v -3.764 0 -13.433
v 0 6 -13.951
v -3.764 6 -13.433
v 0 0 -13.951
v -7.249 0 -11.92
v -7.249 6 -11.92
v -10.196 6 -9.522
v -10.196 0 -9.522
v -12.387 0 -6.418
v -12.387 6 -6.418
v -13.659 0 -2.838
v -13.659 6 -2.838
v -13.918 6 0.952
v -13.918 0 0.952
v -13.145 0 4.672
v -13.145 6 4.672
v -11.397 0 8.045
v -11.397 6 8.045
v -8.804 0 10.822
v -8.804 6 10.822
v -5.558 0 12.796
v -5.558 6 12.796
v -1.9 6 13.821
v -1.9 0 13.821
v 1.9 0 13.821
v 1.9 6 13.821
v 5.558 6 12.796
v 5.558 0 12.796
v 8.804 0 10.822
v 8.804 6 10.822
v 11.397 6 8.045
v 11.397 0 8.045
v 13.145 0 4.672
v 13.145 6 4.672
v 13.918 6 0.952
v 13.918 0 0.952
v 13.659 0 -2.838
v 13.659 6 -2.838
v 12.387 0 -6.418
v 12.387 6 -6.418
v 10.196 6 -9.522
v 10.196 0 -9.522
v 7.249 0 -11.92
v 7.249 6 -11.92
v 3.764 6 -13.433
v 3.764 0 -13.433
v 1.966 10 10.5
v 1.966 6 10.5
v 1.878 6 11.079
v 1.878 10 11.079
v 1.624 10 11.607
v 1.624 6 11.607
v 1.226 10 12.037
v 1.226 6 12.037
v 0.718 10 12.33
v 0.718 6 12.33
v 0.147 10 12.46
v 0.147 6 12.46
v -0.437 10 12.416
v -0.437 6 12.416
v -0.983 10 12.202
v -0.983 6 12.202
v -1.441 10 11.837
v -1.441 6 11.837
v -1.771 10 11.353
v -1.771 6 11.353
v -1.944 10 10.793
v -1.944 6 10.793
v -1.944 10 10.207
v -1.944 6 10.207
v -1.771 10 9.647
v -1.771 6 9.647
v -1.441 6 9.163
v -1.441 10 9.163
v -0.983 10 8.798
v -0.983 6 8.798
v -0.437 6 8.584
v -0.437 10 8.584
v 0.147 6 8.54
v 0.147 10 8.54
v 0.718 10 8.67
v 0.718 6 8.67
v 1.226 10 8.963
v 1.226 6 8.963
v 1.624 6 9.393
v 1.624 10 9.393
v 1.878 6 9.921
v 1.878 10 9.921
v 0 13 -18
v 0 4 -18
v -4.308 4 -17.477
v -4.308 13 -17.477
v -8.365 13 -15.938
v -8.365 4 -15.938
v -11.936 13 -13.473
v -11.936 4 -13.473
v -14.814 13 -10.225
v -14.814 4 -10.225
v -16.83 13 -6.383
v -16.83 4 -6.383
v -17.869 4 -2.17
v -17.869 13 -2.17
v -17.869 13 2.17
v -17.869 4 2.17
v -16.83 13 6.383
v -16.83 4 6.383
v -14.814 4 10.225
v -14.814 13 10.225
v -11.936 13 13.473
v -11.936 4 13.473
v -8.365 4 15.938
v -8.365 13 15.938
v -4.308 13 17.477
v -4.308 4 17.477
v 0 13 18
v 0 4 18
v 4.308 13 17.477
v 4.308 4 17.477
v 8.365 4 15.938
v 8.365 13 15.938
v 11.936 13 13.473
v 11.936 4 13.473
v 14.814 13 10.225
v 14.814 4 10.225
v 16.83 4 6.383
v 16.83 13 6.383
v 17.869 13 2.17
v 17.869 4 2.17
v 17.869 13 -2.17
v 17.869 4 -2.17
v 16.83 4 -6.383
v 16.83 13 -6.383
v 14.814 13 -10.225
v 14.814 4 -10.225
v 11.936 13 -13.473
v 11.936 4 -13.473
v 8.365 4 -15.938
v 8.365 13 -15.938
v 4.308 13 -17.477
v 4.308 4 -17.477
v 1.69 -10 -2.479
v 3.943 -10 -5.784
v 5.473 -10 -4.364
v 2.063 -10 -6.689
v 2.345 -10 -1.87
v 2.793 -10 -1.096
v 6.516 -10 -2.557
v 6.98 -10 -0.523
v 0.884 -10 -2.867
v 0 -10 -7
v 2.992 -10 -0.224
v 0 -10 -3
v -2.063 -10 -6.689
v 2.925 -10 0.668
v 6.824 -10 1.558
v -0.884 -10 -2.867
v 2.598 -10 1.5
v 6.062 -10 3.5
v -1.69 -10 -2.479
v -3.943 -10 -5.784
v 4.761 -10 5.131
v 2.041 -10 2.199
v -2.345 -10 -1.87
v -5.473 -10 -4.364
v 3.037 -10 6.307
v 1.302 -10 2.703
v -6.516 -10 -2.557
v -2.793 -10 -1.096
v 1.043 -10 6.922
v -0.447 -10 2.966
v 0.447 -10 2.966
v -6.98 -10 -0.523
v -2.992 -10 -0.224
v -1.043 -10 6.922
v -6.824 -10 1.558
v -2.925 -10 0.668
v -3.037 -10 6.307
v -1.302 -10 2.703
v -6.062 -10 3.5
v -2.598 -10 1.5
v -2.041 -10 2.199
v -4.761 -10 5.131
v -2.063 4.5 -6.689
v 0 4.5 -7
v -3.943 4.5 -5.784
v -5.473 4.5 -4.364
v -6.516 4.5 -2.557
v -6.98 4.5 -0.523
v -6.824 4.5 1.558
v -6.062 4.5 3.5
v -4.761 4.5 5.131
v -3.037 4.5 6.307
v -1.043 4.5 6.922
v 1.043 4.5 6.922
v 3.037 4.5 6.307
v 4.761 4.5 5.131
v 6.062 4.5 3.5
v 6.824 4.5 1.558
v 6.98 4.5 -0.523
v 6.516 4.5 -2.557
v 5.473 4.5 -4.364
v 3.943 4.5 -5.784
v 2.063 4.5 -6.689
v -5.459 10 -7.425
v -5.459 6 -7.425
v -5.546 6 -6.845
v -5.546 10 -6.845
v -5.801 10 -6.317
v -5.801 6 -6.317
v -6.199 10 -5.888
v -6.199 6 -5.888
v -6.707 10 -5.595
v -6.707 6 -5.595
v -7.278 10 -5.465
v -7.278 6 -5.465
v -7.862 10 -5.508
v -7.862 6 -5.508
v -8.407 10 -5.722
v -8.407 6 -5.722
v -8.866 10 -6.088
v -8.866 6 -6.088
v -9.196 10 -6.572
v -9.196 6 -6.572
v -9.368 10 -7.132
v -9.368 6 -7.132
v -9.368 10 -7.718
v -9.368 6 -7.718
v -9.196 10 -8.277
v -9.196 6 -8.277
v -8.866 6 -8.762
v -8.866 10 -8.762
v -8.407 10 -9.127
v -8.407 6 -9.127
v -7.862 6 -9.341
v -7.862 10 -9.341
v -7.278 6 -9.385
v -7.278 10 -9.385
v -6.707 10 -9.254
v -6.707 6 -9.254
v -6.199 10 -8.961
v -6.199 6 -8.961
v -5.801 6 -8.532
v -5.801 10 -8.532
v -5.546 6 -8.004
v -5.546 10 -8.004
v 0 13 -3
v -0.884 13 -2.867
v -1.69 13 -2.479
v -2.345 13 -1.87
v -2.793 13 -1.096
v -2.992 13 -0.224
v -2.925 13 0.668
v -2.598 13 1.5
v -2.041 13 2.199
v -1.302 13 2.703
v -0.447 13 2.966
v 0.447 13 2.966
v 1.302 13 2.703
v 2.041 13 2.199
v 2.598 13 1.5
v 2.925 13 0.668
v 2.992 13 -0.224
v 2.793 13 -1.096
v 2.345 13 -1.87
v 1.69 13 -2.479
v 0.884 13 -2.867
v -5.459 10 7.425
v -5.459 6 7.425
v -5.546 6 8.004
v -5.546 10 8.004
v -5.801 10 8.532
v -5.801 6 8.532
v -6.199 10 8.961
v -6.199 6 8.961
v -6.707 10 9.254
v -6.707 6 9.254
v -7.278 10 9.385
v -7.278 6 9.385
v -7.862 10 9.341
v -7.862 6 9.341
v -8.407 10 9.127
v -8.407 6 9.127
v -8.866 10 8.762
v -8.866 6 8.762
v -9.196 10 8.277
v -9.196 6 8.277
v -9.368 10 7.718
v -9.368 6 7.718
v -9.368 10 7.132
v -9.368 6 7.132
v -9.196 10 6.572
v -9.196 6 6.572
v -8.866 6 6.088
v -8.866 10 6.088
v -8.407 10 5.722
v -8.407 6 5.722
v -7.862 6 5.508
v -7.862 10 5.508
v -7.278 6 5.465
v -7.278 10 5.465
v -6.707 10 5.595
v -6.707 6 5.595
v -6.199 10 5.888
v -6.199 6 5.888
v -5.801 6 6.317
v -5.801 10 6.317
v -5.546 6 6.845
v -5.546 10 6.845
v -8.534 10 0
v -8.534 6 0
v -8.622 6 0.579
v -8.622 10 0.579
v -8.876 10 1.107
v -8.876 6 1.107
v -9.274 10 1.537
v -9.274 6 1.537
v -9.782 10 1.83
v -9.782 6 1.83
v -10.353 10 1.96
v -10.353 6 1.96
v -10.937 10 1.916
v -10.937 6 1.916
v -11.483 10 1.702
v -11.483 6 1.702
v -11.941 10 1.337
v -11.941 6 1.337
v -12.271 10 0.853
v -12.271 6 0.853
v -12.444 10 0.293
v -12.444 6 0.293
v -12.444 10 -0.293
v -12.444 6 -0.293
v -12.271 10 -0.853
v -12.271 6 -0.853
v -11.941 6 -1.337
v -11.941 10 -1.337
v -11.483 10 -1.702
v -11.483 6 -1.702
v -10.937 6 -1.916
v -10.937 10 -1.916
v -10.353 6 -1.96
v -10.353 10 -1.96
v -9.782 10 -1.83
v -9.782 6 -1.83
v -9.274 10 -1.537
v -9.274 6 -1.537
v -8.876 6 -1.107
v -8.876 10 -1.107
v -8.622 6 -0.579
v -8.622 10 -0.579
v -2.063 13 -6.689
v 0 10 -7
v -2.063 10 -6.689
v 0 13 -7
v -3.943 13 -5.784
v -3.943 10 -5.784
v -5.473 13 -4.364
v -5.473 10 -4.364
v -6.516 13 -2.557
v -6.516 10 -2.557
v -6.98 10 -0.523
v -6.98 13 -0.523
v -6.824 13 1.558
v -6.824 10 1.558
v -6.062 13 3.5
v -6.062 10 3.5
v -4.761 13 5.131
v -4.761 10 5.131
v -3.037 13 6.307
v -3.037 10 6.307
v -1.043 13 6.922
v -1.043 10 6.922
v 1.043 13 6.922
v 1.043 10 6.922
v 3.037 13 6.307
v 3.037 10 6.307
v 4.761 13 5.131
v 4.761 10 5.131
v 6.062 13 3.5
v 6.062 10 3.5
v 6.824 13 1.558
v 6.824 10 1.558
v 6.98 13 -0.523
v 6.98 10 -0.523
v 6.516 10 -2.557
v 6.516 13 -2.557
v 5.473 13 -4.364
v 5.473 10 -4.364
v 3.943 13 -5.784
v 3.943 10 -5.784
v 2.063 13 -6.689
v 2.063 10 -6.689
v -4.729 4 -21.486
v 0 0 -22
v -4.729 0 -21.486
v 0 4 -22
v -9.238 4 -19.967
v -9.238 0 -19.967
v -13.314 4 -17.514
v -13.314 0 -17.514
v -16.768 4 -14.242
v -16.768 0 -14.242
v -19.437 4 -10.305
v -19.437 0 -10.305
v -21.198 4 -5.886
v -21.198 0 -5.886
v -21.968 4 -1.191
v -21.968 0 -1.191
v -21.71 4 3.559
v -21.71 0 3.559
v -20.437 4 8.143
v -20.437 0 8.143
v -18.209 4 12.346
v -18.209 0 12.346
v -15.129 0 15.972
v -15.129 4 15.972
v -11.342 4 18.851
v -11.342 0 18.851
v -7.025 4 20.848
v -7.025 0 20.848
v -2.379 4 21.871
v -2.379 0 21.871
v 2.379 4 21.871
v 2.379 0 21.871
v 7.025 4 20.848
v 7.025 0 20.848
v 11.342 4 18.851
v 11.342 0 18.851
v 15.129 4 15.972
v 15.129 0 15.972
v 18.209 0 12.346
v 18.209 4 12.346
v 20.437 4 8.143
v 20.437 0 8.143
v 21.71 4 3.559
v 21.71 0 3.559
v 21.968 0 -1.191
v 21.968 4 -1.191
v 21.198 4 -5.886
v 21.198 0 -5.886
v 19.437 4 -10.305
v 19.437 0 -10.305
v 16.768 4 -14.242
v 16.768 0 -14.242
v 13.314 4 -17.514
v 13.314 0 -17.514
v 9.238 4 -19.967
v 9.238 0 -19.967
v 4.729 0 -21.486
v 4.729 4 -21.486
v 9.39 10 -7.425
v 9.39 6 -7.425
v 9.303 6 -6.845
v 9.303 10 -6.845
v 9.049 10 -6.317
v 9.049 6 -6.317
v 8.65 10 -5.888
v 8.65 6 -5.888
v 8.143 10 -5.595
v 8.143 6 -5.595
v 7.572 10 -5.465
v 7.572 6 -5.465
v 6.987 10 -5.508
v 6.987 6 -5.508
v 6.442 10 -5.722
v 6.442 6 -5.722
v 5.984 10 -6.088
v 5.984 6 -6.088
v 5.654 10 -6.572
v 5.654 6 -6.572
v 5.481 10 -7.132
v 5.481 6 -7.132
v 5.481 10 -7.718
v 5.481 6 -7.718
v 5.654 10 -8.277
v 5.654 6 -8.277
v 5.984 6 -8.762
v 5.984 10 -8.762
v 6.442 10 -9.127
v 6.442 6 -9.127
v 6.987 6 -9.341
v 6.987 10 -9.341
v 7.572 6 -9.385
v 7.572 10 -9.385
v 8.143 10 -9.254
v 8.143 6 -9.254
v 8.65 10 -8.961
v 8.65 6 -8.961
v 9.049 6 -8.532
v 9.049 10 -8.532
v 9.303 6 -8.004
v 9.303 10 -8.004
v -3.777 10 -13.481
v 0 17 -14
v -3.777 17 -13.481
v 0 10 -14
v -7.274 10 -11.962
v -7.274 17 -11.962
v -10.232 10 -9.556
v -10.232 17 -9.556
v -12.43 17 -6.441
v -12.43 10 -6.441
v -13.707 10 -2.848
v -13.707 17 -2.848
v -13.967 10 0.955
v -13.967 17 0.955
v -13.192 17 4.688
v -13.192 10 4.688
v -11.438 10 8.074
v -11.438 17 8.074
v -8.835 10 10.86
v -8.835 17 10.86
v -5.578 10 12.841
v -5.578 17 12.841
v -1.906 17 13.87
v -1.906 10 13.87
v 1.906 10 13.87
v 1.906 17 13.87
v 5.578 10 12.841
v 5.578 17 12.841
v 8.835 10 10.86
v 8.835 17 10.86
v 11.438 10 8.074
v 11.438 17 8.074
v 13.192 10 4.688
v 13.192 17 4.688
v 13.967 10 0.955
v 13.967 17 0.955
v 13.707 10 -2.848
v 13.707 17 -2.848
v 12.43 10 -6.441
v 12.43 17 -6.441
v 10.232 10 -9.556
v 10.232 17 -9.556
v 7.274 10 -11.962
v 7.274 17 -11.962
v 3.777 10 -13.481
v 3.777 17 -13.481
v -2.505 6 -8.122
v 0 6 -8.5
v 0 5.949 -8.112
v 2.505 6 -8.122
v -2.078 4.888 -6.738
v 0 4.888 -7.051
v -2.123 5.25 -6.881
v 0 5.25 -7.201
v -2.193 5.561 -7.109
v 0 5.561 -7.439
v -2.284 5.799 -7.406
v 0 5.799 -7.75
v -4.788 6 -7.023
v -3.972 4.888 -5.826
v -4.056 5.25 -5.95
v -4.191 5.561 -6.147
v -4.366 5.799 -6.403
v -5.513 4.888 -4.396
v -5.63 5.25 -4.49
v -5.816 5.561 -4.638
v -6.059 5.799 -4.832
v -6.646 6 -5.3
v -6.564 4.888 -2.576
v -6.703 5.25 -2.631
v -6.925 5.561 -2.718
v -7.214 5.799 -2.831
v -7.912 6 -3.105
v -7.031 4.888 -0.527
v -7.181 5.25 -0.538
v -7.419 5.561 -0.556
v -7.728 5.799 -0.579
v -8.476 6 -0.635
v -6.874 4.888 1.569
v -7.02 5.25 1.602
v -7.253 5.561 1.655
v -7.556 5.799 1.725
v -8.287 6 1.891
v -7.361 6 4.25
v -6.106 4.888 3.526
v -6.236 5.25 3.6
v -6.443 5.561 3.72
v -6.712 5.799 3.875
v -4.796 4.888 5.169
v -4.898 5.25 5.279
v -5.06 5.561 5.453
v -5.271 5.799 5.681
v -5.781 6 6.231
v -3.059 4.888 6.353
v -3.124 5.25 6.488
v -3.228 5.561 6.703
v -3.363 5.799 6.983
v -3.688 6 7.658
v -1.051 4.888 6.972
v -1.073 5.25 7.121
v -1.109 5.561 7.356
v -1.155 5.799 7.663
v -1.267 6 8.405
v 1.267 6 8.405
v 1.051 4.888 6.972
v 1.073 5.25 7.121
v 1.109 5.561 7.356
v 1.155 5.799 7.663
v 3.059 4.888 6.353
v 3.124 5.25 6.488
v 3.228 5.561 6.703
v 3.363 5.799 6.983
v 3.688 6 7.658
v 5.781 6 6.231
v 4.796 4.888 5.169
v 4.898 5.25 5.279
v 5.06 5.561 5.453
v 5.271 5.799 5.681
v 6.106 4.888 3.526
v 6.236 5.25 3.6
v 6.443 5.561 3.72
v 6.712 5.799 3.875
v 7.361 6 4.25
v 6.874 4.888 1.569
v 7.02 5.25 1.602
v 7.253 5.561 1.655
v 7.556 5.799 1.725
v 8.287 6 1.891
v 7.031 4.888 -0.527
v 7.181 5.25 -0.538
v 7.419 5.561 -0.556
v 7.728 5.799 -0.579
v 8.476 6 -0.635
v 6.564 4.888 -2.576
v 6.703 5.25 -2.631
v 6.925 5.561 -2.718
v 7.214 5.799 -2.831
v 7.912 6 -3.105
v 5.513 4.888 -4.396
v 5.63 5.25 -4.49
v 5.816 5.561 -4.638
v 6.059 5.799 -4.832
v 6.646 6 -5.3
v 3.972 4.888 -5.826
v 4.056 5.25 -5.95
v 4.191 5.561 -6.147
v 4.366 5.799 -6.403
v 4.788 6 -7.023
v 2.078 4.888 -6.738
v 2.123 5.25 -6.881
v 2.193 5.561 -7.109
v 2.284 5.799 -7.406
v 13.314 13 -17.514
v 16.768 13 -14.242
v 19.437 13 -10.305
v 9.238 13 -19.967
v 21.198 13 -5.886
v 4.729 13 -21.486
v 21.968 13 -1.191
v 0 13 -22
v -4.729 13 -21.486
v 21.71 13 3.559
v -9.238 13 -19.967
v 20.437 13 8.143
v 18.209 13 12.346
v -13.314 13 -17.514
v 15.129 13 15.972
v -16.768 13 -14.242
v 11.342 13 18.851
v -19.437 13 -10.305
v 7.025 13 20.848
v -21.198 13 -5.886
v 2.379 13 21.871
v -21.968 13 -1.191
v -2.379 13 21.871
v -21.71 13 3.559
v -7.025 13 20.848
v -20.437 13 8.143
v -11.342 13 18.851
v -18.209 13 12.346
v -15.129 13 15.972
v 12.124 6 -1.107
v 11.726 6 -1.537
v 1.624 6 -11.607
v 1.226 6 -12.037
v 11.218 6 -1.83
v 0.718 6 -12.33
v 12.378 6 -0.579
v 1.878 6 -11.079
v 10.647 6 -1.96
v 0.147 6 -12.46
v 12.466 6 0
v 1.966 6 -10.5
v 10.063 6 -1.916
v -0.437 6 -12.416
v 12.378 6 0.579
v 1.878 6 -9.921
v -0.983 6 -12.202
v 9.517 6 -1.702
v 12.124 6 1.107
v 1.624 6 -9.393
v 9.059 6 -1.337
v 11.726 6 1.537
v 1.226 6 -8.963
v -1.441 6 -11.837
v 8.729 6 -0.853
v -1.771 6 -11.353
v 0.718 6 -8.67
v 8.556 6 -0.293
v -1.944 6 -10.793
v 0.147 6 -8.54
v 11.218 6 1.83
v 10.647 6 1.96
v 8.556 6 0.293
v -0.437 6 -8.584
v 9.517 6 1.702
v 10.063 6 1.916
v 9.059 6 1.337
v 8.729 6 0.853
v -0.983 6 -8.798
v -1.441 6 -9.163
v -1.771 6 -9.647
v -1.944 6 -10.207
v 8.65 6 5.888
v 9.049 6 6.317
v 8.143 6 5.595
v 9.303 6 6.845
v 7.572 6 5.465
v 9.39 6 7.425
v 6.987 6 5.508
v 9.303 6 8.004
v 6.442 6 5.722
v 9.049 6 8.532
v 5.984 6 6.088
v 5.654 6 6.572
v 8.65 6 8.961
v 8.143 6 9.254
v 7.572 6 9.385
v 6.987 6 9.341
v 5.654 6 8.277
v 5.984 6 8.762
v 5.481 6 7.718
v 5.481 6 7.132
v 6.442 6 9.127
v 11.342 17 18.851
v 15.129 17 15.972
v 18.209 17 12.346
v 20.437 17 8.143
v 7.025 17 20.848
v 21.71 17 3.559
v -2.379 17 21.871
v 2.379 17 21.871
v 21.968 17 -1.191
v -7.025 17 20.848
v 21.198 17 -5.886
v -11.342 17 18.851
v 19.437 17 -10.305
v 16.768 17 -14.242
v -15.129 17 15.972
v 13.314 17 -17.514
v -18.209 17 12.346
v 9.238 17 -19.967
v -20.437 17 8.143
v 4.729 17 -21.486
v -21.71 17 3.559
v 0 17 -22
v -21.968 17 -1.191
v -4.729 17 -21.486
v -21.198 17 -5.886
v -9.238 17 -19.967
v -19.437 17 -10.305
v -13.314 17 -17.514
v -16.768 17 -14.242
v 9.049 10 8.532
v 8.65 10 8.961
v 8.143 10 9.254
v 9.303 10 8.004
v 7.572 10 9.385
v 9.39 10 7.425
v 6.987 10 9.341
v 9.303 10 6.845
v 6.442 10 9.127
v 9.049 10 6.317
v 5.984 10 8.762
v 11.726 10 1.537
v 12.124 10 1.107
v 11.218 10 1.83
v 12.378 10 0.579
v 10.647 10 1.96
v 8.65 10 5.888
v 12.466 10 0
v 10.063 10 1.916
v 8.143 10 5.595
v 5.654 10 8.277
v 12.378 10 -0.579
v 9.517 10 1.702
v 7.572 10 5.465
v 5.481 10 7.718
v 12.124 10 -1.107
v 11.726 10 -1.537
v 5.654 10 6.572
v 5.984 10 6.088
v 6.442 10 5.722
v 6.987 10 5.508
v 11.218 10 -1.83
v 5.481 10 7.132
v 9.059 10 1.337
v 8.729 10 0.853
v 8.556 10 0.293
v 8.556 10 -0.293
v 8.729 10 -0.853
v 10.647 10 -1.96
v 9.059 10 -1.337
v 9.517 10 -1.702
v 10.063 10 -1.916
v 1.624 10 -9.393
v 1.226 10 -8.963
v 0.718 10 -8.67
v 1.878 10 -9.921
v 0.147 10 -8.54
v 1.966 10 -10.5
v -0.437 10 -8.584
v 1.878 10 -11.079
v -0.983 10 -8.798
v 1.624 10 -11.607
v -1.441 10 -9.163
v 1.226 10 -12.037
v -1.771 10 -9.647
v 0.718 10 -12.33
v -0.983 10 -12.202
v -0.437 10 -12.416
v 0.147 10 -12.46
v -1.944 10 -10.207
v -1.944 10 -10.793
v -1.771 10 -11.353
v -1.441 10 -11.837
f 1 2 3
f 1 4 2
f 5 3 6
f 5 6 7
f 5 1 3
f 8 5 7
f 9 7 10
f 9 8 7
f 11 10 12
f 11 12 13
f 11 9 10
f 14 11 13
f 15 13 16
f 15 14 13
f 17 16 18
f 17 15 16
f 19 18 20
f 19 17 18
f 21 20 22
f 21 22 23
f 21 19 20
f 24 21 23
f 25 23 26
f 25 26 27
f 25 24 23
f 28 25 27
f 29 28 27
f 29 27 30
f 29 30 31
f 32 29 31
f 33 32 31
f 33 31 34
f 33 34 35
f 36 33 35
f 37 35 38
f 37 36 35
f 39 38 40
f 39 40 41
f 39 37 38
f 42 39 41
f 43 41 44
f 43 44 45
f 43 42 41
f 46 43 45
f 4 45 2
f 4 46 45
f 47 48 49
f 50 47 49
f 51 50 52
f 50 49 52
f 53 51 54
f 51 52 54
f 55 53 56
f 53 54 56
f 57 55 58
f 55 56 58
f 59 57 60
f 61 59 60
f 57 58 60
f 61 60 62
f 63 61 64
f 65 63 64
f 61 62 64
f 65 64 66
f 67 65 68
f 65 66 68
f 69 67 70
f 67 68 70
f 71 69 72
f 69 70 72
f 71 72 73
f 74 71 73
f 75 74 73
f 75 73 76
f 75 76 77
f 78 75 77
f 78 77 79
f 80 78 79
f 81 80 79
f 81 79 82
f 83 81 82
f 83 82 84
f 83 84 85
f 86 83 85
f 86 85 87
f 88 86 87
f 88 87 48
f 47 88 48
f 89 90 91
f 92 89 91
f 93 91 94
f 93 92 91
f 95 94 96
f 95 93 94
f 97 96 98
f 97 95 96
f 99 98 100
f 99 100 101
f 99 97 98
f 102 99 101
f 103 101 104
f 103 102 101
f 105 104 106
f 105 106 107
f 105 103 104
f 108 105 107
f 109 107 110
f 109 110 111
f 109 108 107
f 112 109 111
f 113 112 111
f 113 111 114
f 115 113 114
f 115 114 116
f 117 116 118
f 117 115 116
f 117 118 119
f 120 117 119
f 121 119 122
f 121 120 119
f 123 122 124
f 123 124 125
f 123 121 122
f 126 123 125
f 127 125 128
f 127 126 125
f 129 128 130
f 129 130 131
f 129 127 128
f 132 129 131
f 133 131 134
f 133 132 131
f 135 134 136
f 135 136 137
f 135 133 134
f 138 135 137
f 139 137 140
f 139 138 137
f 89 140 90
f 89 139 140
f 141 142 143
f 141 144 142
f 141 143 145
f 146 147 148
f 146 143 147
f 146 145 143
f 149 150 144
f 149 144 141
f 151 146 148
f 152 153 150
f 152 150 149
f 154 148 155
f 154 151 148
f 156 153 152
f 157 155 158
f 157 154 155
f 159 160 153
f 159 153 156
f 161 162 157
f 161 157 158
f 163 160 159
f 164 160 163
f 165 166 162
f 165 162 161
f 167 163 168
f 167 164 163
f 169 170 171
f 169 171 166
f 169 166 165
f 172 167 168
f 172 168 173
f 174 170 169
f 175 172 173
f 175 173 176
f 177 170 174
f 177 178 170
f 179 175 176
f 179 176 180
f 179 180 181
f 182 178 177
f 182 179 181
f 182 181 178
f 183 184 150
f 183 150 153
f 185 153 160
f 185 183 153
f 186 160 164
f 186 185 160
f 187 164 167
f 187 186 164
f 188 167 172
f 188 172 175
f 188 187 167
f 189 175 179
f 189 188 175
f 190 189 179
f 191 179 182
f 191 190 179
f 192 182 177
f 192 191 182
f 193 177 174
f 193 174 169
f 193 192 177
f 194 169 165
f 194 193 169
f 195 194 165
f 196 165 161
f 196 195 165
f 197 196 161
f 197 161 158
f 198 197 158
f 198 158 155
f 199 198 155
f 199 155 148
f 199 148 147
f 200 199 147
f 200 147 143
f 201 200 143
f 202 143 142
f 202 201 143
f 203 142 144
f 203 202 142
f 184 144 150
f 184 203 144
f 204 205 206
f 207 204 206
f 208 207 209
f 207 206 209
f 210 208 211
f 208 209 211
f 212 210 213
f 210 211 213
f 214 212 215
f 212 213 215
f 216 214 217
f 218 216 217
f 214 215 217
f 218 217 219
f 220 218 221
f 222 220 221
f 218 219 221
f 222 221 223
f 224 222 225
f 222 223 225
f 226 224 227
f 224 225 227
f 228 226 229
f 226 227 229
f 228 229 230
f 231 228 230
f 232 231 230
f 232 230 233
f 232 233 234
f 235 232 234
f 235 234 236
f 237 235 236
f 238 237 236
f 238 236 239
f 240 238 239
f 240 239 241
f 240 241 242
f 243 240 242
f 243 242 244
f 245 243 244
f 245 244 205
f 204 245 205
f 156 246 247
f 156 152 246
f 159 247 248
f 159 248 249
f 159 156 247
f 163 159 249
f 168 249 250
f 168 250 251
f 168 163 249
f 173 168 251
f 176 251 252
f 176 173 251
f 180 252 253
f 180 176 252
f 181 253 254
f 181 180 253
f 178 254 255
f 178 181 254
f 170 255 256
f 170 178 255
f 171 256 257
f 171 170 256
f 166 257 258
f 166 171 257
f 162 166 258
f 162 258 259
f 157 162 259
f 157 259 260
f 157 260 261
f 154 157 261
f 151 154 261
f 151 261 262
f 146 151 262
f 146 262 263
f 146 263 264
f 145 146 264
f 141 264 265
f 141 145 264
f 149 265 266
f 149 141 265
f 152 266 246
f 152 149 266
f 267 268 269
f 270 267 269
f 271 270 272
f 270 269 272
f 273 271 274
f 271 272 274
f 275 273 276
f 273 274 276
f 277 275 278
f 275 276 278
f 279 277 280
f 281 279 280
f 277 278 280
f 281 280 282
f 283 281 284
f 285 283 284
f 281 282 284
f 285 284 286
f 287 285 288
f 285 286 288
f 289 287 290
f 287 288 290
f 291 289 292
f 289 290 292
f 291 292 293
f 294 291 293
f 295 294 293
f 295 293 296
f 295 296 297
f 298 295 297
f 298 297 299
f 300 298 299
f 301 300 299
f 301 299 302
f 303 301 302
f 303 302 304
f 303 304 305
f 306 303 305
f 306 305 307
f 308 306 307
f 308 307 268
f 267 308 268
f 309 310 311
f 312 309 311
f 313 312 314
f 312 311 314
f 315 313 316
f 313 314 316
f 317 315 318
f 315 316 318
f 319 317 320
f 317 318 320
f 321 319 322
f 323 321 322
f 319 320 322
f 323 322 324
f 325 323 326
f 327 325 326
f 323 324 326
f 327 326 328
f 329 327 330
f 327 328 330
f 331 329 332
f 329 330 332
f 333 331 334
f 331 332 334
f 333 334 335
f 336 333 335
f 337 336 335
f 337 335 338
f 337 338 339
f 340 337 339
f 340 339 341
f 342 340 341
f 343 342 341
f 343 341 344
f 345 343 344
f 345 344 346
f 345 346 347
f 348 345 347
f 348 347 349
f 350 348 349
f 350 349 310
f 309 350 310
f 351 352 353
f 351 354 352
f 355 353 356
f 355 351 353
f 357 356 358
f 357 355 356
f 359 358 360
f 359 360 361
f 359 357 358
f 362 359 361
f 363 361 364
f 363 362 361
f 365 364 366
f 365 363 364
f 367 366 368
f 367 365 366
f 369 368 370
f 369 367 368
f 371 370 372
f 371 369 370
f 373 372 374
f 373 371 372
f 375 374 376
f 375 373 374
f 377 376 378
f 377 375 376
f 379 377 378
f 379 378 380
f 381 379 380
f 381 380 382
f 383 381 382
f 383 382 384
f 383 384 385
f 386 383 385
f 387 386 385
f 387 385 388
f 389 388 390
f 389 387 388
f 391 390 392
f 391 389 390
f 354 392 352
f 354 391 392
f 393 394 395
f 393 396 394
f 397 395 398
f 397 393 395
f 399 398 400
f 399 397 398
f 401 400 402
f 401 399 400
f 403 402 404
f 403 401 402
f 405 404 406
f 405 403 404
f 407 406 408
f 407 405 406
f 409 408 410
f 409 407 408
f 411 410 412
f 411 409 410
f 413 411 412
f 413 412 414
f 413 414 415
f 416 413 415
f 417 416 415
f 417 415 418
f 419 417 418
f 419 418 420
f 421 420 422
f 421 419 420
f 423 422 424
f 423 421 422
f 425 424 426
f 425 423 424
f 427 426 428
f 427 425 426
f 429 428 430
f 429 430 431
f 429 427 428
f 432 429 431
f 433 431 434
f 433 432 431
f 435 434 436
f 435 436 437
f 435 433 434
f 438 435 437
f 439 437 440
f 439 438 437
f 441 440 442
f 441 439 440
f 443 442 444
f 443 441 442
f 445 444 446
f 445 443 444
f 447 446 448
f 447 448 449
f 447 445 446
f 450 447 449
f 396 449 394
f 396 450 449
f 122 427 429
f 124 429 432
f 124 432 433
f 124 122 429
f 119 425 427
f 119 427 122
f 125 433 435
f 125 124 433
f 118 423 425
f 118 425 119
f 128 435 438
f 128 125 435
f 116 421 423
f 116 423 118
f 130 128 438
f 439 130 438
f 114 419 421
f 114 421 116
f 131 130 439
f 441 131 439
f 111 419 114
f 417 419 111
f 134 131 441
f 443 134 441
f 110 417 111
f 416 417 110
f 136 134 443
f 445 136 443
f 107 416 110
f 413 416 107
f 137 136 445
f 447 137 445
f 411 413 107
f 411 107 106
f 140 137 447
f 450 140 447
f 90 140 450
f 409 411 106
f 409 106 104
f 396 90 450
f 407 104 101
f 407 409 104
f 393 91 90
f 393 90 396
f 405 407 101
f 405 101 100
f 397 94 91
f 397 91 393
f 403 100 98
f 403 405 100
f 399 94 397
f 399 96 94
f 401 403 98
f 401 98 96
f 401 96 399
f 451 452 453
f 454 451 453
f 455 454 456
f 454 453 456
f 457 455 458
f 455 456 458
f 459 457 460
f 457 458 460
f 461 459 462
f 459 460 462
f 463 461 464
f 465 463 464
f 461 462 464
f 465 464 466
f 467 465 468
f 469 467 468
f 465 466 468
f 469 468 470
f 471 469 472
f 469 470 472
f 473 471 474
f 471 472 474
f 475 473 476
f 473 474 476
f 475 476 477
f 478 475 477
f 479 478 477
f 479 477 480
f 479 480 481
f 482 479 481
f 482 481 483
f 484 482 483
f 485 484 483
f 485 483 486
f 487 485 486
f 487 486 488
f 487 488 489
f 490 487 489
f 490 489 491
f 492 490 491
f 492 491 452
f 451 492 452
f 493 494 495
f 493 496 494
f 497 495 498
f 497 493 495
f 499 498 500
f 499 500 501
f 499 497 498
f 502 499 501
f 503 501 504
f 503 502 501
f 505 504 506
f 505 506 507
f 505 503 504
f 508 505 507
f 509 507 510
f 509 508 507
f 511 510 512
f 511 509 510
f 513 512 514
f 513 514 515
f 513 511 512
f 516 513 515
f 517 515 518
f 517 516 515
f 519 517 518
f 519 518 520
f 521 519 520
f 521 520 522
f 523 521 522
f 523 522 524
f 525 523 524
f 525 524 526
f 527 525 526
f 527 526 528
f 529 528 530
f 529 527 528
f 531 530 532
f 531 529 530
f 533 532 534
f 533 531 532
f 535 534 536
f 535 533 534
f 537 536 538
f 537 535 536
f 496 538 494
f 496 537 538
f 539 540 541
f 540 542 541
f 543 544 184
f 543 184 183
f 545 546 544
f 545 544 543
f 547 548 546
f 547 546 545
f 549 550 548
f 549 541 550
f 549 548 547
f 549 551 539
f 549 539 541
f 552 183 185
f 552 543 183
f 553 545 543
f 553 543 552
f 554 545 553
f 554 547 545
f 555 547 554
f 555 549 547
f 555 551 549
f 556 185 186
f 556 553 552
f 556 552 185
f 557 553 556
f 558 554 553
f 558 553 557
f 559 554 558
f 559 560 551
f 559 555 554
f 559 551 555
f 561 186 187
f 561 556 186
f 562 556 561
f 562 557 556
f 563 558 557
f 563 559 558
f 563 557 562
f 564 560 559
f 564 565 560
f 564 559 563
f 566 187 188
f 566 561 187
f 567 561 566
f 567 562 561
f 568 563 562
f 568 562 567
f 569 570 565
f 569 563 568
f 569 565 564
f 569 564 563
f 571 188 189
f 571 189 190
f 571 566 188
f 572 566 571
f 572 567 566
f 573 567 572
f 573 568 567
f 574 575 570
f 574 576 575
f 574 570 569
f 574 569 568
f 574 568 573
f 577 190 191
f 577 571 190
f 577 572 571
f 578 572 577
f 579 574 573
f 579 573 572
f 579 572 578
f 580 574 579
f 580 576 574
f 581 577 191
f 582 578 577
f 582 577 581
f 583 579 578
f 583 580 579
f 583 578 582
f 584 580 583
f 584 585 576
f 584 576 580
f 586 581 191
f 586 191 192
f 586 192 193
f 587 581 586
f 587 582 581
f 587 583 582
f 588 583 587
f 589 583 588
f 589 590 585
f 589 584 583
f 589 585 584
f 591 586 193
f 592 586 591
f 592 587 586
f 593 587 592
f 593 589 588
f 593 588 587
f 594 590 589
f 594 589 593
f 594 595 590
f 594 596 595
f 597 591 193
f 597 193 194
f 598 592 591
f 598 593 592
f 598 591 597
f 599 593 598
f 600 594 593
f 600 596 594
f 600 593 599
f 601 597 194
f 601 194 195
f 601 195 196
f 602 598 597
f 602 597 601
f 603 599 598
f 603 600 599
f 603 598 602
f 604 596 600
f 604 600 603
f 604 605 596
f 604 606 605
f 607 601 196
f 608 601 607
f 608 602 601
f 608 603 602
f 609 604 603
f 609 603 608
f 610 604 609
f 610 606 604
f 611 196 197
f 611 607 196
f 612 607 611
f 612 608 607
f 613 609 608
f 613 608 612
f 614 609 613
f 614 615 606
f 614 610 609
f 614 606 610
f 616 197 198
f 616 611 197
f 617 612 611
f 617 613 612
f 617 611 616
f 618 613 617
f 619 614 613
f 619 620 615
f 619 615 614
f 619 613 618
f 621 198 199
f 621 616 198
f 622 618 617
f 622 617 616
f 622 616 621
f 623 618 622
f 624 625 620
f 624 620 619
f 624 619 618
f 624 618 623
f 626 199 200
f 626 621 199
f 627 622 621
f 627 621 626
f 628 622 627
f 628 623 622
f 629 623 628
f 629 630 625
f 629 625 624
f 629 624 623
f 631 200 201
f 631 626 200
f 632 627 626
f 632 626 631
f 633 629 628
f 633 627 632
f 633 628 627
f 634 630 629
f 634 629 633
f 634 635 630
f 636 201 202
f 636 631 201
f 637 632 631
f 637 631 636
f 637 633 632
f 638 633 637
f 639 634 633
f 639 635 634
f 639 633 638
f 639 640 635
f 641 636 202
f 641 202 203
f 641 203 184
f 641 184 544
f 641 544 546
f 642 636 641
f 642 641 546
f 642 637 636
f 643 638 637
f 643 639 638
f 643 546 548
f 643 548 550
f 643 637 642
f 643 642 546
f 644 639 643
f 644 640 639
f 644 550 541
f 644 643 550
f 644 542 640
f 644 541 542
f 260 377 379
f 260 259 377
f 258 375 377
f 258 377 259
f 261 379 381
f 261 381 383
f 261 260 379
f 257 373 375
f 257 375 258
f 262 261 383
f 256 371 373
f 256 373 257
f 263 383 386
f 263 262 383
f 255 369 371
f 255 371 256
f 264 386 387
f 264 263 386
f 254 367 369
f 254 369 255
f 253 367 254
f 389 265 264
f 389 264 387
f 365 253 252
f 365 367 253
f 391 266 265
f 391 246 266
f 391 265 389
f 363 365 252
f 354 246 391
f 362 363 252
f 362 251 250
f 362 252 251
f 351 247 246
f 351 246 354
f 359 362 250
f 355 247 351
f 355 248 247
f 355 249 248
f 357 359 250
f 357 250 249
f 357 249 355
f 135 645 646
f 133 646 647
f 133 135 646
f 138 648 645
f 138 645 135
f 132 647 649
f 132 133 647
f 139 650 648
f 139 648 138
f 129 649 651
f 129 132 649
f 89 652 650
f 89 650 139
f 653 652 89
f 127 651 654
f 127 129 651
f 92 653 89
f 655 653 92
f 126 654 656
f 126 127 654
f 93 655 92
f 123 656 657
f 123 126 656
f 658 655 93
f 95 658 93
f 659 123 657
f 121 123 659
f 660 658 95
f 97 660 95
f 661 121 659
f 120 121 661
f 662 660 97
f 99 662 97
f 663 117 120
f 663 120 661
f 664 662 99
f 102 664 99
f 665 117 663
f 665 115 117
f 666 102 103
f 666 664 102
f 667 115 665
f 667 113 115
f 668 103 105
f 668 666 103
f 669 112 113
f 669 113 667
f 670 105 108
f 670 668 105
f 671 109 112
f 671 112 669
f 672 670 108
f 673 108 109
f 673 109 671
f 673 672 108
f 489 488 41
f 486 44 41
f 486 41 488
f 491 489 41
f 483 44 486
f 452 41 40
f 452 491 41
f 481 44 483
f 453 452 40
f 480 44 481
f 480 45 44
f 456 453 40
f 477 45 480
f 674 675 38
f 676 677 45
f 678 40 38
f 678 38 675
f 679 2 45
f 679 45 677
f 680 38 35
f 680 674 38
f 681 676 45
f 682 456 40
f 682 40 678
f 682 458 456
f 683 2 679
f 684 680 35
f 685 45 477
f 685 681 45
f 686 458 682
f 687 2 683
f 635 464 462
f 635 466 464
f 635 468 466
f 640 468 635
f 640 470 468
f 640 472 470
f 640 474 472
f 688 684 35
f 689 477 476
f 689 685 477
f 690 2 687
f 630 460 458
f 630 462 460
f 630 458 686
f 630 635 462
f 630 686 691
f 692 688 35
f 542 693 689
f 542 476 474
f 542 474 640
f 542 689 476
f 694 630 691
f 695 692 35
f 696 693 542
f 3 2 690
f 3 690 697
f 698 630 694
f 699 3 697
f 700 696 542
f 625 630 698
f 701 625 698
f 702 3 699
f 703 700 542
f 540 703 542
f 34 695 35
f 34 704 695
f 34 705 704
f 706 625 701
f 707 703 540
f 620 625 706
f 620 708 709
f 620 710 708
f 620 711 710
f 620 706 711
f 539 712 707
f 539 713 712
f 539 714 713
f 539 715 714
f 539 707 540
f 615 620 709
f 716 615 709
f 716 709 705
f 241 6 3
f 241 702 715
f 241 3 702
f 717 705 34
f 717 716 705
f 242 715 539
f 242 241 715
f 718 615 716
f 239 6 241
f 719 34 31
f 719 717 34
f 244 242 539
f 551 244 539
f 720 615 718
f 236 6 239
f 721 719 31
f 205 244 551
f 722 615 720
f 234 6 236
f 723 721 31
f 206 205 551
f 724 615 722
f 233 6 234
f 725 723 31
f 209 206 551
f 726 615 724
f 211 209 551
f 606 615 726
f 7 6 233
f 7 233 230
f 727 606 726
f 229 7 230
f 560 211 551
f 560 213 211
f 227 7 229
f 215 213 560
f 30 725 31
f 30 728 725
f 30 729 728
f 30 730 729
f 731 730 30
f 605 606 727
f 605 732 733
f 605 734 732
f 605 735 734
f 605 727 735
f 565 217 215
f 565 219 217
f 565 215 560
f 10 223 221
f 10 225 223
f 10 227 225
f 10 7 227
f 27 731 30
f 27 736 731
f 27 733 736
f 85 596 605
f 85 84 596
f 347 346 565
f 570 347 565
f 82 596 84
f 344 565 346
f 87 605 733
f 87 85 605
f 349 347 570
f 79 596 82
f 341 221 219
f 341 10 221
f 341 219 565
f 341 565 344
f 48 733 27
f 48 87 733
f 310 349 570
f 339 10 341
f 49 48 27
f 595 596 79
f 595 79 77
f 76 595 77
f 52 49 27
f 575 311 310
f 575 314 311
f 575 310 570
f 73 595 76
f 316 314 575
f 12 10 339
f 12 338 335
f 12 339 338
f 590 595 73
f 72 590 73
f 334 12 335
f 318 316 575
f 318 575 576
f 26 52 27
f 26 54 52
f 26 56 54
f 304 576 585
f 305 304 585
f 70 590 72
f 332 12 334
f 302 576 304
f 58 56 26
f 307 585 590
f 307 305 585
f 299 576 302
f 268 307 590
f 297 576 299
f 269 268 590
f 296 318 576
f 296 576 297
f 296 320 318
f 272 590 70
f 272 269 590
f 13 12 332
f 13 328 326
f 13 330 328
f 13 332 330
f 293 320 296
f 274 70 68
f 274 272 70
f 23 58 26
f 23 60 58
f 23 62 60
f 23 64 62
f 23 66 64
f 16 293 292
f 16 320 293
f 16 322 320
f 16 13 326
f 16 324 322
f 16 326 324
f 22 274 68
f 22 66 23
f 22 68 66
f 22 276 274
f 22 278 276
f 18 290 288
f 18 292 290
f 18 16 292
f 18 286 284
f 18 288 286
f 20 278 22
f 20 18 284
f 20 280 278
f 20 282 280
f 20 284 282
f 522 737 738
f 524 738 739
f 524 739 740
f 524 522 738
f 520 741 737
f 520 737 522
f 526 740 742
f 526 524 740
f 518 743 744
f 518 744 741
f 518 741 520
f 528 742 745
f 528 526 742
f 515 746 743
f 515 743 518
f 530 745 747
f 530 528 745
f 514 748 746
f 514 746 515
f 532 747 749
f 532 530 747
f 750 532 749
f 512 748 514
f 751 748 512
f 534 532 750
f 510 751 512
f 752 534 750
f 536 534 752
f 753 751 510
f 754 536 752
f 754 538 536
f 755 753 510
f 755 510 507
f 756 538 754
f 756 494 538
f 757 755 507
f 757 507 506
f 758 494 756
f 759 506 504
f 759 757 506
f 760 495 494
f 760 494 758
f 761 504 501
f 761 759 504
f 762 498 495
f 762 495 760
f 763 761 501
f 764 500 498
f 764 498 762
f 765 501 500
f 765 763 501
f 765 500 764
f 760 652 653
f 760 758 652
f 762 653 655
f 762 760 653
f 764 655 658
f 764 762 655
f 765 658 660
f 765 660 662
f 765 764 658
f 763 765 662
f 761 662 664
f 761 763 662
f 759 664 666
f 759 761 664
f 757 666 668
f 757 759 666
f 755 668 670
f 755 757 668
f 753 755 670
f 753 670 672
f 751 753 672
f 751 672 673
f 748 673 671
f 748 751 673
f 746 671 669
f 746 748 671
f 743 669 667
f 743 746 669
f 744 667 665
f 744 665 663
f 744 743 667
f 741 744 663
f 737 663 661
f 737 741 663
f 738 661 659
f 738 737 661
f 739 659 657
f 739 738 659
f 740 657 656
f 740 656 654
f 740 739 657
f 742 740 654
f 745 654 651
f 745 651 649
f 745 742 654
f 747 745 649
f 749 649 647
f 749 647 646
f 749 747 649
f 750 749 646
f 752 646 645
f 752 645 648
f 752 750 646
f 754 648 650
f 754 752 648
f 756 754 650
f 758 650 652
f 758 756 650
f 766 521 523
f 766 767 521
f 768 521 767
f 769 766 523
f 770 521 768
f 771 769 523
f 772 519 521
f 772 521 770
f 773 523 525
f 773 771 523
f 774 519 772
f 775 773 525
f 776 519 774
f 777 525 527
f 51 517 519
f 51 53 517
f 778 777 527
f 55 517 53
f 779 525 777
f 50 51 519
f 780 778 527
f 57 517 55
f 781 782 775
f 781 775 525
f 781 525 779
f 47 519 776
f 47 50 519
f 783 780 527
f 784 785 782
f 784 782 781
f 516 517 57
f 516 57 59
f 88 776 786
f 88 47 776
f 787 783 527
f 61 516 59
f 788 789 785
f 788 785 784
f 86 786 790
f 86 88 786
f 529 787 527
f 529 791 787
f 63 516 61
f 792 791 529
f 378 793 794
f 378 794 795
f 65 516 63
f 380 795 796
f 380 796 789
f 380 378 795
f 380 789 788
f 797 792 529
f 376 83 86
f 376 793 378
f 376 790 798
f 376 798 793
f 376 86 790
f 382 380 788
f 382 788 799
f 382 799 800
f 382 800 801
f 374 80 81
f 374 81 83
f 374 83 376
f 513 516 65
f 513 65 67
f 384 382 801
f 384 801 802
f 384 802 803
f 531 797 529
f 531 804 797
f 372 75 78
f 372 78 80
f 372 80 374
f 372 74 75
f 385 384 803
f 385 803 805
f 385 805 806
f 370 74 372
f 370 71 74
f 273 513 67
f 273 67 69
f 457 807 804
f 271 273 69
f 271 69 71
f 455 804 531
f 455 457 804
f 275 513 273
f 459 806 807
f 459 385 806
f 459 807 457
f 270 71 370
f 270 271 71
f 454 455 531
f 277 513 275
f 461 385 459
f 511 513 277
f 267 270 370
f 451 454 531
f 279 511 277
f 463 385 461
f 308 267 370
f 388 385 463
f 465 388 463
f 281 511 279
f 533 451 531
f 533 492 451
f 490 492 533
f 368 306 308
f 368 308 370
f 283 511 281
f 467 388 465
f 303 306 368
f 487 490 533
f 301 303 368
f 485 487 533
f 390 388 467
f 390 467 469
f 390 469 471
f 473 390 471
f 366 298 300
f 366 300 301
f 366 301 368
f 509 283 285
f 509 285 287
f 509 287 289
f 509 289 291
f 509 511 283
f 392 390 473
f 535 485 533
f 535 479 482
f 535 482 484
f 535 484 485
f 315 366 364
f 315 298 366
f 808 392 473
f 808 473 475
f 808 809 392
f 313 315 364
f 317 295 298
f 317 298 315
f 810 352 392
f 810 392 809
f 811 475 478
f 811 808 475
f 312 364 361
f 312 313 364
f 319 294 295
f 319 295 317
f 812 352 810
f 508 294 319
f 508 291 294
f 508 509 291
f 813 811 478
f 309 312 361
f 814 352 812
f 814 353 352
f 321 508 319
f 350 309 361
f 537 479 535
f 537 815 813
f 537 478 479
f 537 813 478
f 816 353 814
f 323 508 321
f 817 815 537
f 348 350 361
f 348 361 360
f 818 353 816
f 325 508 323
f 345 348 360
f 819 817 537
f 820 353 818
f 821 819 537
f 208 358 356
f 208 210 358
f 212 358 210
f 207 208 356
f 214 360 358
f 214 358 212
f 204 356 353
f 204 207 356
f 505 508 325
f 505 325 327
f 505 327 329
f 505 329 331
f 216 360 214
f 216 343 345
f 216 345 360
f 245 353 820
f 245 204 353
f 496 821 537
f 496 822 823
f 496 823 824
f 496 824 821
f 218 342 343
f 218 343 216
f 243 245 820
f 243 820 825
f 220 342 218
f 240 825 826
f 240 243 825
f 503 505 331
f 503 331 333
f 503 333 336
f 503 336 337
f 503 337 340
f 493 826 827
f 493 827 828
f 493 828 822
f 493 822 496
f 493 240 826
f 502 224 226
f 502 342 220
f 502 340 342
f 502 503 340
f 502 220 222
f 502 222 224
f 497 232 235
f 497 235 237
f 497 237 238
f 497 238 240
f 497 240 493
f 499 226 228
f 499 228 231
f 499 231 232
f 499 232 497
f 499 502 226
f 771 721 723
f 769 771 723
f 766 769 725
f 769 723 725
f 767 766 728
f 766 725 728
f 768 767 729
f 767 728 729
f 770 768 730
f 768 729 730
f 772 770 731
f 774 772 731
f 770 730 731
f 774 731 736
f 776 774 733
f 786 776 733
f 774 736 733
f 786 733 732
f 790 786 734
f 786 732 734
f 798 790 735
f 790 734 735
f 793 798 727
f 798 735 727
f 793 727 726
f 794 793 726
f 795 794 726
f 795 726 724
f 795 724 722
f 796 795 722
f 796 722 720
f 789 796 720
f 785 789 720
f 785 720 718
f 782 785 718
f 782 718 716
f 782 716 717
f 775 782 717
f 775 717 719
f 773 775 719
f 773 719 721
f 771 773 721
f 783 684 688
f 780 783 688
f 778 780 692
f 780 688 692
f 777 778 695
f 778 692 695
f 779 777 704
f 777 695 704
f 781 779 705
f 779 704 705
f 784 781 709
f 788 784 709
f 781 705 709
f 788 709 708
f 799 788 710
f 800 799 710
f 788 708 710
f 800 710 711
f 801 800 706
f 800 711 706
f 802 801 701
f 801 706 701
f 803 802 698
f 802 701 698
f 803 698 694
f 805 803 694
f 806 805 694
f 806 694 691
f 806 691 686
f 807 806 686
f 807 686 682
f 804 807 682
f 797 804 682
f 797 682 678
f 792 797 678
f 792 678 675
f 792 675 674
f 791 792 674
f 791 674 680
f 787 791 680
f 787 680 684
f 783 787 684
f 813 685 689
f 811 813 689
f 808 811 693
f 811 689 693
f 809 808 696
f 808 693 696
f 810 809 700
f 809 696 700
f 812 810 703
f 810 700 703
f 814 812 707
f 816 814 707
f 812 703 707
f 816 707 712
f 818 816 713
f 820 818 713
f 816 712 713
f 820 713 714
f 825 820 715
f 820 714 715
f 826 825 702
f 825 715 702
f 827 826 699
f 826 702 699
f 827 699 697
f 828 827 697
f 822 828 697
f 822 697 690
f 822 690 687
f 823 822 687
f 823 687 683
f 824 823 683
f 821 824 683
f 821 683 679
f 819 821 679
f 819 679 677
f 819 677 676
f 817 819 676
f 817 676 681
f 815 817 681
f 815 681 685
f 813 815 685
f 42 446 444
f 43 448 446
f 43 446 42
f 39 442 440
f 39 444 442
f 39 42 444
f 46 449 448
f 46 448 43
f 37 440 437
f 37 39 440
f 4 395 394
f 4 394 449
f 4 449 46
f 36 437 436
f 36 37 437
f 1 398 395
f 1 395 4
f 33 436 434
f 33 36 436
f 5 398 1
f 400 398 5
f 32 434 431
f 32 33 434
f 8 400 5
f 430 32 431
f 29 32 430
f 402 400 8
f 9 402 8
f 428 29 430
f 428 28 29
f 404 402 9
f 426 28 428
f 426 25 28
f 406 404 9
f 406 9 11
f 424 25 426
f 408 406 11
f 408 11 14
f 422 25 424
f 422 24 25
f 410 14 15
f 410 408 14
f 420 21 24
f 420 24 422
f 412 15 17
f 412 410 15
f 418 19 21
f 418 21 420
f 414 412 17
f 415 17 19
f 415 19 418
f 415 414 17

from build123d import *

# Parameters (mm, degrees)
F3_R     = 1.965614
F4_DEPTH = 11.001
F5_R     = 1.5


with BuildPart() as f1:
    # F0 (on Right) → F1 (revolve)
    with BuildSketch(Plane.YZ):
        Polygon((13, -3), (-10, -3), (-10, -7), (6, -7), (6, -13.950632), (0, -13.950632), (0, -22), (4, -22), (4, -18), (13, -18), (13, -22), (17, -22), (17, -14), (10, -14), (10, -7), (13, -7), align=None)
    revolve(axis=Axis((0, -0.087436, 0), (0, 1, 0)))

    # F3 (on face) → F4 (cut, through all)
    with BuildSketch(Plane.XZ.offset(-6)):
        with Locations((10.5, 0)):
            Circle(F3_R)
        with Locations((7.424621, 7.424621)):
            Circle(F3_R)
        with Locations((0, 10.5)):
            Circle(F3_R)
        with Locations((-7.424621, 7.424621)):
            Circle(F3_R)
        with Locations((-10.5, 0)):
            Circle(F3_R)
        with Locations((-7.424621, -7.424621)):
            Circle(F3_R)
        with Locations((0, -10.5)):
            Circle(F3_R)
        with Locations((7.424621, -7.424621)):
            Circle(F3_R)
    extrude(amount=-F4_DEPTH, mode=Mode.SUBTRACT)

    # F5
    f5_edges = [f1.edges().sort_by_distance(p)[0] for p in [
        (0, 6, 7),
    ]]
    fillet(f5_edges, radius=F5_R)


solid = f1.part
